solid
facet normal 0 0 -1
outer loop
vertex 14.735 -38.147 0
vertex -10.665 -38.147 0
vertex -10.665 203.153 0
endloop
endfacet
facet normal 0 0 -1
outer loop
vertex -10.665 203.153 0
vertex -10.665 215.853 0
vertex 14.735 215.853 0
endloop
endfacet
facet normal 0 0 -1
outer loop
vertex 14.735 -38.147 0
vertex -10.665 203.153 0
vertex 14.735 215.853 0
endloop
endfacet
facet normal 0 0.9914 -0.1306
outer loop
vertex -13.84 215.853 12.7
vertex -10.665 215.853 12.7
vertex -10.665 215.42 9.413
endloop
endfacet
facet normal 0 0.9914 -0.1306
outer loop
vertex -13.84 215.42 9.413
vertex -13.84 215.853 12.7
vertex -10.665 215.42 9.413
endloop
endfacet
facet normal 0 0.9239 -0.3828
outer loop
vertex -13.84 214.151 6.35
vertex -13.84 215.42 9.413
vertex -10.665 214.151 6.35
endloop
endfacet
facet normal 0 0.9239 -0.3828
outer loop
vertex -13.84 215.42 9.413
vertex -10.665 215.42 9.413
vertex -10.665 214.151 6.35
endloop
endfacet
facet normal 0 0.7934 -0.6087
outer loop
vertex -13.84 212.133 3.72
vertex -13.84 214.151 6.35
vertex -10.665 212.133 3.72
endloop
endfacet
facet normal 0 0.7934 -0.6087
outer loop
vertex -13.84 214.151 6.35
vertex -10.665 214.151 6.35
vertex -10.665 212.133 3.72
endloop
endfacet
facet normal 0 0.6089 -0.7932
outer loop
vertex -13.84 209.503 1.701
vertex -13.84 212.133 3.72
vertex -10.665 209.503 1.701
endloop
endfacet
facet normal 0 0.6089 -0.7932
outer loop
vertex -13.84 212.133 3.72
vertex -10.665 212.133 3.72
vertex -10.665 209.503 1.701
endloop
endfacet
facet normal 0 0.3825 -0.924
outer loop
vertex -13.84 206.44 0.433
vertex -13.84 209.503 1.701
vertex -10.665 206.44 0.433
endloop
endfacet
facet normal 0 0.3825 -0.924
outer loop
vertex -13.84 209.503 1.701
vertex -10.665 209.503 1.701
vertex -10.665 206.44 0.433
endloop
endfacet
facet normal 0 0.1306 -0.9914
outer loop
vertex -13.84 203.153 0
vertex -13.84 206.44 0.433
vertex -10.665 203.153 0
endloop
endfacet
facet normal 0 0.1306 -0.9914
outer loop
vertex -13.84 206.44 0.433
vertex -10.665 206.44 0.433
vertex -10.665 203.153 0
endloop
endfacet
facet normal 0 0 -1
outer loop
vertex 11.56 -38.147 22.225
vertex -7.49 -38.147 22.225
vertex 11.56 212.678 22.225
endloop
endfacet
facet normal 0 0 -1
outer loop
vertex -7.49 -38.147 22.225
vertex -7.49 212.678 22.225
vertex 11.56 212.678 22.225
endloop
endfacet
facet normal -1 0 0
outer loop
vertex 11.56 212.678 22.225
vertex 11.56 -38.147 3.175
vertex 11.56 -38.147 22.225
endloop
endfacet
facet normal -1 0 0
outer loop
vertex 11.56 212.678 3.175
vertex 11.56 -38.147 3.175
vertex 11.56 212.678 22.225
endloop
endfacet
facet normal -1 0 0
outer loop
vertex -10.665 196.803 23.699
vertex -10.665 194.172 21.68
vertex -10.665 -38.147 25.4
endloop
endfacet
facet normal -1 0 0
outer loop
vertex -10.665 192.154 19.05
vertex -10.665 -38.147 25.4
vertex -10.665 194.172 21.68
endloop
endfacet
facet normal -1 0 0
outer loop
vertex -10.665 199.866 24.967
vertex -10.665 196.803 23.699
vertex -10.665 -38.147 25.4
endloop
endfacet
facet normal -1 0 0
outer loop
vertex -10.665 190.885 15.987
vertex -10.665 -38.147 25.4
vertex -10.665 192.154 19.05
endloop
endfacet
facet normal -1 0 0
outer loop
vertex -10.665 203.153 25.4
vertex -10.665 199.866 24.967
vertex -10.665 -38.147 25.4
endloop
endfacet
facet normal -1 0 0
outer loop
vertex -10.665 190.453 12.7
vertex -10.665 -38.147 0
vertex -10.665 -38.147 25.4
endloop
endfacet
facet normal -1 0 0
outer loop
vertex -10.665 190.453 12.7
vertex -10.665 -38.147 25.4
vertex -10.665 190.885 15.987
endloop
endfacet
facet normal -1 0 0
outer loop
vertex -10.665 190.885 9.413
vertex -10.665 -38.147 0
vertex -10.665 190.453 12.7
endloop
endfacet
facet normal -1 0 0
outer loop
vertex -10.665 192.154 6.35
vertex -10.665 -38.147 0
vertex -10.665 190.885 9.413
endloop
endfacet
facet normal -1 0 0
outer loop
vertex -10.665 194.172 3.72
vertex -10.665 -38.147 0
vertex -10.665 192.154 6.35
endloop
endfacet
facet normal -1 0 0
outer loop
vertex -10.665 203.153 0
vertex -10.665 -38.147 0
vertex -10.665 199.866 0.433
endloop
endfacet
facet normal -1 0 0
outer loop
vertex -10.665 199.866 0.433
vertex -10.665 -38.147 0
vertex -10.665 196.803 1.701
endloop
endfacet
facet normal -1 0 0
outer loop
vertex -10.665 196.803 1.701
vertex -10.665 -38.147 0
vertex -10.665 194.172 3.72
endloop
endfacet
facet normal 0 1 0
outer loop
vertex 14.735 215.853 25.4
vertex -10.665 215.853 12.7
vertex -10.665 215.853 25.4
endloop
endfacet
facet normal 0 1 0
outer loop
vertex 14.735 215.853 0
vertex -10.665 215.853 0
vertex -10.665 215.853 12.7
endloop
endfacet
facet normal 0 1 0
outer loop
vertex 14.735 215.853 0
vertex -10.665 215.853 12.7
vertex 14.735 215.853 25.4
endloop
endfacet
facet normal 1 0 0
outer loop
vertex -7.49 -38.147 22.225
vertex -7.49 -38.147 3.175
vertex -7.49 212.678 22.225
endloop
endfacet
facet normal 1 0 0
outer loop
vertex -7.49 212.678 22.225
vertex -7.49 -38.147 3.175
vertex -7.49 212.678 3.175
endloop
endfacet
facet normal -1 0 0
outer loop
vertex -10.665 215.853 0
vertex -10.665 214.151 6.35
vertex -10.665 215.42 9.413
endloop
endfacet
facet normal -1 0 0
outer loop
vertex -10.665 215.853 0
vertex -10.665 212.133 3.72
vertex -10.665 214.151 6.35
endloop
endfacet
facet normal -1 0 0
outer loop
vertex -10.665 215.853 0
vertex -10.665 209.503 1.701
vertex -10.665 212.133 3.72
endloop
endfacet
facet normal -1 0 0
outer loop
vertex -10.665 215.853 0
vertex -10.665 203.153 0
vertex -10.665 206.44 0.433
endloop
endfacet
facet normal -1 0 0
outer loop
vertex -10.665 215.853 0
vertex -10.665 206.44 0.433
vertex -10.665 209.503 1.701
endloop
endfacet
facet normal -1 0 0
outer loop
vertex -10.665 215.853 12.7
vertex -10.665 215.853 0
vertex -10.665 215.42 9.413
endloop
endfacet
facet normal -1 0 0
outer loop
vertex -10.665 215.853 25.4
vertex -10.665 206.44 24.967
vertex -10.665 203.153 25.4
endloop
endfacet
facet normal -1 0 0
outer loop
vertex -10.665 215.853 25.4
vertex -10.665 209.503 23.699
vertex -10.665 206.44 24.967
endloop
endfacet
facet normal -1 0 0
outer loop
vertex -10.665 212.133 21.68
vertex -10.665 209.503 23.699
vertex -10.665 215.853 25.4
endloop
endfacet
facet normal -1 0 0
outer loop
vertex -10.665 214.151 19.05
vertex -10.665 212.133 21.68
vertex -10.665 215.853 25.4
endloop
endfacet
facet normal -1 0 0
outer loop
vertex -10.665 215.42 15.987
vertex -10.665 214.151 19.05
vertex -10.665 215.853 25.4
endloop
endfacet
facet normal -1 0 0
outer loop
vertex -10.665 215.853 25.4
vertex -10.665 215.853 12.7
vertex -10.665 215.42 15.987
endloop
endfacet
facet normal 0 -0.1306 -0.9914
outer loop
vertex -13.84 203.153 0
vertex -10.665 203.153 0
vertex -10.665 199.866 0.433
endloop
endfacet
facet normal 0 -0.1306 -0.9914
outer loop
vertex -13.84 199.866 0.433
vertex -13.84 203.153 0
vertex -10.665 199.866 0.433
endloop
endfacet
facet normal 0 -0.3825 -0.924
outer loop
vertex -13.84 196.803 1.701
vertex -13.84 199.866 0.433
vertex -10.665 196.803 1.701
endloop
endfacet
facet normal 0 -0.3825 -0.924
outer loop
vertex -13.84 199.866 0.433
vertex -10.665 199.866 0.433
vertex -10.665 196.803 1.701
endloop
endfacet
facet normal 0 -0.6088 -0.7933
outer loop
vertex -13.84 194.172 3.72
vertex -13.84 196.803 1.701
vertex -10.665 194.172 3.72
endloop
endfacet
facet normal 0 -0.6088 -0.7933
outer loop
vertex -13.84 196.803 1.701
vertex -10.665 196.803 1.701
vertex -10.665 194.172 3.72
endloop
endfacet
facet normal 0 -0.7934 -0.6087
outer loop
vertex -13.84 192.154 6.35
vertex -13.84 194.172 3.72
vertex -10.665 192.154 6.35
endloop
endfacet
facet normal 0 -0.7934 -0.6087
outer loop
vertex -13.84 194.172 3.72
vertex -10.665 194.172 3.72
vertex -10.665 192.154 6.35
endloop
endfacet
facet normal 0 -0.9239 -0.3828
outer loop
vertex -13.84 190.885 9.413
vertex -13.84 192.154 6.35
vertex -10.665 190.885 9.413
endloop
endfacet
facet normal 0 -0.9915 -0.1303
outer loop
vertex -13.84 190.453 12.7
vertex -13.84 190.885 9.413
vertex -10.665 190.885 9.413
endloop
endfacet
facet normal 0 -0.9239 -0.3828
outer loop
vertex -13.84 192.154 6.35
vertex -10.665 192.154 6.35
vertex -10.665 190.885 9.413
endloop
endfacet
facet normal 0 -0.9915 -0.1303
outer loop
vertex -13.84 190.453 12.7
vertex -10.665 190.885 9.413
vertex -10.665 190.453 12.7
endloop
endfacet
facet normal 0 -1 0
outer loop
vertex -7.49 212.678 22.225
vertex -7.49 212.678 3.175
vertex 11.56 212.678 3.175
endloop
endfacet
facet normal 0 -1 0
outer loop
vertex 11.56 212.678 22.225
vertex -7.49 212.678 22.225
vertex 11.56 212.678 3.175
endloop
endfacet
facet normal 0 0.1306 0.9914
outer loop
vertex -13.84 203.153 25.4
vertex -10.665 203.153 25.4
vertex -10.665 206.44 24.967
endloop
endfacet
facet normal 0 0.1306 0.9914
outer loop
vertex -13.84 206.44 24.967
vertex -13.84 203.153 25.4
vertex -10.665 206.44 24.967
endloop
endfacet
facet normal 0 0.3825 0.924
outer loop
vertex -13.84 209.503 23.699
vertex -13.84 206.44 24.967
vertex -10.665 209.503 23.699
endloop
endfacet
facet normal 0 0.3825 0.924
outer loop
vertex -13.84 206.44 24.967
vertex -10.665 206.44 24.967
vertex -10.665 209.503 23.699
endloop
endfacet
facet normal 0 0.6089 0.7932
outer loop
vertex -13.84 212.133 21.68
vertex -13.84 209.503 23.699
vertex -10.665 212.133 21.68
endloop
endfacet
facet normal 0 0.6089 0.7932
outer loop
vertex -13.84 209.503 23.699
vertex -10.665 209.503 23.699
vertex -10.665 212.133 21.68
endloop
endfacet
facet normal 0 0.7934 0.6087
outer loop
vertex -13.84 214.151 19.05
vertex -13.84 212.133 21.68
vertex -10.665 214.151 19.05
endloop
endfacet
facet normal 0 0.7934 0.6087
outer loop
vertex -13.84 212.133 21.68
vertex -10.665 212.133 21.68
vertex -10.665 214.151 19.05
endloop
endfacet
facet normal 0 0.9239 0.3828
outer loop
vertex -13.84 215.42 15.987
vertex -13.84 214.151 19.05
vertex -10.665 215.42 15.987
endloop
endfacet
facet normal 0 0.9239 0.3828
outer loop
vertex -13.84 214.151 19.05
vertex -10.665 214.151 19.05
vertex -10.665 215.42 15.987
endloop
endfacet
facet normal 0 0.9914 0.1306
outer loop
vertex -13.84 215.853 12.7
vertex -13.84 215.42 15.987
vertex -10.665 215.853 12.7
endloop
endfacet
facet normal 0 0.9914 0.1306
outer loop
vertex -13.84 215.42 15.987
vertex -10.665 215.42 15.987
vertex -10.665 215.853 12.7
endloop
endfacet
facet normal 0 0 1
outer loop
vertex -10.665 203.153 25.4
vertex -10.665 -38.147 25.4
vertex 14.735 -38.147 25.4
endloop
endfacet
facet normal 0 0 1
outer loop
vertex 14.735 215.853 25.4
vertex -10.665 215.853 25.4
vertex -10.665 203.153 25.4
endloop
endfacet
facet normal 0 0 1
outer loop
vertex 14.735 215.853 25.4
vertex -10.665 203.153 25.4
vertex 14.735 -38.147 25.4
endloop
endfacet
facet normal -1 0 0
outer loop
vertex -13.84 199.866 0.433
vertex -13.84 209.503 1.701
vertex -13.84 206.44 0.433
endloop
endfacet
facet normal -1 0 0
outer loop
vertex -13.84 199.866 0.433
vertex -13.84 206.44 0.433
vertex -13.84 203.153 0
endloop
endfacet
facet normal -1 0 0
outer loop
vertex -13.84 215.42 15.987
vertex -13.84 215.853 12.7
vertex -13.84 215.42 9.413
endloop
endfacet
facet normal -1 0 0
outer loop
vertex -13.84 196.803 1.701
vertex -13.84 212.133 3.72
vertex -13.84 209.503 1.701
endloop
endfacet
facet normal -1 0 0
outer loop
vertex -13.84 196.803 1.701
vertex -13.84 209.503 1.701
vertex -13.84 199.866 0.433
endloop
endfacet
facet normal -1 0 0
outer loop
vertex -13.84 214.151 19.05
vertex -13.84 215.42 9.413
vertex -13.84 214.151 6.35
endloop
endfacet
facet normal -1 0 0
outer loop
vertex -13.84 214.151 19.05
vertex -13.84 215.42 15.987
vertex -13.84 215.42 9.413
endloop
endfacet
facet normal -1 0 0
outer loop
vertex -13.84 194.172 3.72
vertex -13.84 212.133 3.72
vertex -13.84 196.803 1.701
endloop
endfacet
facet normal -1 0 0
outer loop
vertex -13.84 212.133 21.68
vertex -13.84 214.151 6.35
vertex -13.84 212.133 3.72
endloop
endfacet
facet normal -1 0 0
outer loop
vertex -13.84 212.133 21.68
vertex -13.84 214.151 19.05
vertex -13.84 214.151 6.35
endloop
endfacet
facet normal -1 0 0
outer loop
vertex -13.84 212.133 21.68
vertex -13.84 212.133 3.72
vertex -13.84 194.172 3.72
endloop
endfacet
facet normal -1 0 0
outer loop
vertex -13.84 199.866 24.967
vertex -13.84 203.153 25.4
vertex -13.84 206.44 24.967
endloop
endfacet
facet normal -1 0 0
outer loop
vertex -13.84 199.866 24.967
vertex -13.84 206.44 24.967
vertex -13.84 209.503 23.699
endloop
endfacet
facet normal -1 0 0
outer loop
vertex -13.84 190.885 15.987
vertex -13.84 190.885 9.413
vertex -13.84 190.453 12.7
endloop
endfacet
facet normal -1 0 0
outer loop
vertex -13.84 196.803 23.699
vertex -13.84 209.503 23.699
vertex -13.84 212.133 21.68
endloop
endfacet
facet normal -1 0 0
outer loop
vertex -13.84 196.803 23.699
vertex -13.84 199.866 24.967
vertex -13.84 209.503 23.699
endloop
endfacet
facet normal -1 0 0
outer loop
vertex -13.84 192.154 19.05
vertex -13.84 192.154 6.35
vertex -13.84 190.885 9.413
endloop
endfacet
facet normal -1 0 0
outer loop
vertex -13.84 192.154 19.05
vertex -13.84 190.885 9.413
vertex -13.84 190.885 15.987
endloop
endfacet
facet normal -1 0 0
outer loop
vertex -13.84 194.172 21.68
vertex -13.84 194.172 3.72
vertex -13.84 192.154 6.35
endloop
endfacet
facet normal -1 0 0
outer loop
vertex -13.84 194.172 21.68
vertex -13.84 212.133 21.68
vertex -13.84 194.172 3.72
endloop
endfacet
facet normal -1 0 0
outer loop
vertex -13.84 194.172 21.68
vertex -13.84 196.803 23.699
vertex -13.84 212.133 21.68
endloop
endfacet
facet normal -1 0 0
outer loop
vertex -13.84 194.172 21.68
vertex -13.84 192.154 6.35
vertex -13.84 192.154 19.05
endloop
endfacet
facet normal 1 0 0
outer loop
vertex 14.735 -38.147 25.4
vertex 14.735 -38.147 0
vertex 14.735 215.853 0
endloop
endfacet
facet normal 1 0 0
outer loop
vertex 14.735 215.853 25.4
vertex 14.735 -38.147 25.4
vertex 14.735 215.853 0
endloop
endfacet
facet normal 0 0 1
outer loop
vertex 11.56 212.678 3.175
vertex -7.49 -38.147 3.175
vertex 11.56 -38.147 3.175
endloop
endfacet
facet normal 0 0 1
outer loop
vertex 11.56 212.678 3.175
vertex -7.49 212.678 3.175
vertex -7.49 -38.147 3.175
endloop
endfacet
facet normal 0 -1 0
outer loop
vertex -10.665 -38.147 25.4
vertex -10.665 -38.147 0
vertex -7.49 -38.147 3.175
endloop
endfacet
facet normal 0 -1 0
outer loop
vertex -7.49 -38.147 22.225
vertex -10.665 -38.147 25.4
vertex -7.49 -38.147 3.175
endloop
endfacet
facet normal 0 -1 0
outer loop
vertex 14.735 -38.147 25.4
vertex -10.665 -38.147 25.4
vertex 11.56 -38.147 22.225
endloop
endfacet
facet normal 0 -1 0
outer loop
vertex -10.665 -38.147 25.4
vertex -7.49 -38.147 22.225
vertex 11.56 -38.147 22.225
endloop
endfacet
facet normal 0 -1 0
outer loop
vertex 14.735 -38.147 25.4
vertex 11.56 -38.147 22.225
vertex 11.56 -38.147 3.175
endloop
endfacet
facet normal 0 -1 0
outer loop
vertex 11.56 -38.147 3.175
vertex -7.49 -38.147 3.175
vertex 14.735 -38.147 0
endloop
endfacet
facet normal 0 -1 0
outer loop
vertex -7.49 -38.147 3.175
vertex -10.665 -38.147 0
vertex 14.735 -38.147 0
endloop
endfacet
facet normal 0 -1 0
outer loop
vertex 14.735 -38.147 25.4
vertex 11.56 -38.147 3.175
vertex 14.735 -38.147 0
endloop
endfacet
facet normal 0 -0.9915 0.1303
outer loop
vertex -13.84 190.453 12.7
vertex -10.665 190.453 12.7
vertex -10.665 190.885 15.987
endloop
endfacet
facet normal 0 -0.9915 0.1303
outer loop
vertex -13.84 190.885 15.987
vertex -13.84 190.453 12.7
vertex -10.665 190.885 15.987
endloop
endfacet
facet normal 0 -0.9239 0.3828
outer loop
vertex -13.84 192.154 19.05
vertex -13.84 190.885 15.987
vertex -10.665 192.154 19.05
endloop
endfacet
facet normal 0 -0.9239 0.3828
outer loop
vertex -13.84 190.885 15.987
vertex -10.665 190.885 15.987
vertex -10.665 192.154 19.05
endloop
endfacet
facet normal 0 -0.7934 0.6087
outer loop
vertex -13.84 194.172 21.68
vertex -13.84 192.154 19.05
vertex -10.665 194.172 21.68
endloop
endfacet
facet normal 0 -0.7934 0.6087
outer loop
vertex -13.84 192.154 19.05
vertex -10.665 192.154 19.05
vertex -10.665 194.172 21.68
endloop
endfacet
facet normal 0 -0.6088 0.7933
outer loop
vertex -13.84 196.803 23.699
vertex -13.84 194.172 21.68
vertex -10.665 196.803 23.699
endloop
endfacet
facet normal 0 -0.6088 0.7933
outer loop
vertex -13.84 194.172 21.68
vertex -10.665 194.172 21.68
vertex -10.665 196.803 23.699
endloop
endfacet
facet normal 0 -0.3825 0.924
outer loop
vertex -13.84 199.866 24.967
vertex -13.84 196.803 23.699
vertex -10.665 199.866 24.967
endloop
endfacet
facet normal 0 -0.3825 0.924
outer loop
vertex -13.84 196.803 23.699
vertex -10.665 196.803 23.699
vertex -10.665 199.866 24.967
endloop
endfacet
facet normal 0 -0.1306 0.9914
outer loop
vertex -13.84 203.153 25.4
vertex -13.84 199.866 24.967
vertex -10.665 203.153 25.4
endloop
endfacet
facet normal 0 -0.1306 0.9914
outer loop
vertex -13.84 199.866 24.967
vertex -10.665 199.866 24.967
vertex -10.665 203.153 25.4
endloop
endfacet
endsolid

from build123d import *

# Parameters (mm, degrees)
F0_W     = 25.4
F0_H     = 254
F1_DEPTH = 25.4
F2_T     = -3.175
F4_DEPTH = 3.175


with BuildPart() as f1:
    # F0 (on Top) → F1 (new body)
    with BuildSketch(Plane.XY):
        with Locations((2.03523, 88.852645)):
            Rectangle(F0_W, F0_H)
    extrude(amount=F1_DEPTH)

    # F2
    f2_openings = [f1.faces().sort_by_distance(p)[0] for p in [
        (2.03523, -38.147355, 12.7),
    ]]
    offset(amount=F2_T, openings=f2_openings)

    # F3 (on face) → F4 (join)
    with BuildSketch(Plane(origin=(-10.66477, 0, 0), x_dir=(0, -1, 0), z_dir=(-1, 0, 0))):
        with BuildLine():
            ThreePointArc((-203.152645, 0), (-194.172389, 3.719744), (-190.452645, 12.7))
            ThreePointArc((-190.452645, 12.7), (-194.172389, 21.680256), (-203.152645, 25.4))
            ThreePointArc((-203.152645, 25.4), (-212.132901, 21.680256), (-215.852645, 12.7))
            ThreePointArc((-215.852645, 12.7), (-212.132901, 3.719744), (-203.152645, 0))
        make_face()
    extrude(amount=F4_DEPTH)


solid = f1.part
